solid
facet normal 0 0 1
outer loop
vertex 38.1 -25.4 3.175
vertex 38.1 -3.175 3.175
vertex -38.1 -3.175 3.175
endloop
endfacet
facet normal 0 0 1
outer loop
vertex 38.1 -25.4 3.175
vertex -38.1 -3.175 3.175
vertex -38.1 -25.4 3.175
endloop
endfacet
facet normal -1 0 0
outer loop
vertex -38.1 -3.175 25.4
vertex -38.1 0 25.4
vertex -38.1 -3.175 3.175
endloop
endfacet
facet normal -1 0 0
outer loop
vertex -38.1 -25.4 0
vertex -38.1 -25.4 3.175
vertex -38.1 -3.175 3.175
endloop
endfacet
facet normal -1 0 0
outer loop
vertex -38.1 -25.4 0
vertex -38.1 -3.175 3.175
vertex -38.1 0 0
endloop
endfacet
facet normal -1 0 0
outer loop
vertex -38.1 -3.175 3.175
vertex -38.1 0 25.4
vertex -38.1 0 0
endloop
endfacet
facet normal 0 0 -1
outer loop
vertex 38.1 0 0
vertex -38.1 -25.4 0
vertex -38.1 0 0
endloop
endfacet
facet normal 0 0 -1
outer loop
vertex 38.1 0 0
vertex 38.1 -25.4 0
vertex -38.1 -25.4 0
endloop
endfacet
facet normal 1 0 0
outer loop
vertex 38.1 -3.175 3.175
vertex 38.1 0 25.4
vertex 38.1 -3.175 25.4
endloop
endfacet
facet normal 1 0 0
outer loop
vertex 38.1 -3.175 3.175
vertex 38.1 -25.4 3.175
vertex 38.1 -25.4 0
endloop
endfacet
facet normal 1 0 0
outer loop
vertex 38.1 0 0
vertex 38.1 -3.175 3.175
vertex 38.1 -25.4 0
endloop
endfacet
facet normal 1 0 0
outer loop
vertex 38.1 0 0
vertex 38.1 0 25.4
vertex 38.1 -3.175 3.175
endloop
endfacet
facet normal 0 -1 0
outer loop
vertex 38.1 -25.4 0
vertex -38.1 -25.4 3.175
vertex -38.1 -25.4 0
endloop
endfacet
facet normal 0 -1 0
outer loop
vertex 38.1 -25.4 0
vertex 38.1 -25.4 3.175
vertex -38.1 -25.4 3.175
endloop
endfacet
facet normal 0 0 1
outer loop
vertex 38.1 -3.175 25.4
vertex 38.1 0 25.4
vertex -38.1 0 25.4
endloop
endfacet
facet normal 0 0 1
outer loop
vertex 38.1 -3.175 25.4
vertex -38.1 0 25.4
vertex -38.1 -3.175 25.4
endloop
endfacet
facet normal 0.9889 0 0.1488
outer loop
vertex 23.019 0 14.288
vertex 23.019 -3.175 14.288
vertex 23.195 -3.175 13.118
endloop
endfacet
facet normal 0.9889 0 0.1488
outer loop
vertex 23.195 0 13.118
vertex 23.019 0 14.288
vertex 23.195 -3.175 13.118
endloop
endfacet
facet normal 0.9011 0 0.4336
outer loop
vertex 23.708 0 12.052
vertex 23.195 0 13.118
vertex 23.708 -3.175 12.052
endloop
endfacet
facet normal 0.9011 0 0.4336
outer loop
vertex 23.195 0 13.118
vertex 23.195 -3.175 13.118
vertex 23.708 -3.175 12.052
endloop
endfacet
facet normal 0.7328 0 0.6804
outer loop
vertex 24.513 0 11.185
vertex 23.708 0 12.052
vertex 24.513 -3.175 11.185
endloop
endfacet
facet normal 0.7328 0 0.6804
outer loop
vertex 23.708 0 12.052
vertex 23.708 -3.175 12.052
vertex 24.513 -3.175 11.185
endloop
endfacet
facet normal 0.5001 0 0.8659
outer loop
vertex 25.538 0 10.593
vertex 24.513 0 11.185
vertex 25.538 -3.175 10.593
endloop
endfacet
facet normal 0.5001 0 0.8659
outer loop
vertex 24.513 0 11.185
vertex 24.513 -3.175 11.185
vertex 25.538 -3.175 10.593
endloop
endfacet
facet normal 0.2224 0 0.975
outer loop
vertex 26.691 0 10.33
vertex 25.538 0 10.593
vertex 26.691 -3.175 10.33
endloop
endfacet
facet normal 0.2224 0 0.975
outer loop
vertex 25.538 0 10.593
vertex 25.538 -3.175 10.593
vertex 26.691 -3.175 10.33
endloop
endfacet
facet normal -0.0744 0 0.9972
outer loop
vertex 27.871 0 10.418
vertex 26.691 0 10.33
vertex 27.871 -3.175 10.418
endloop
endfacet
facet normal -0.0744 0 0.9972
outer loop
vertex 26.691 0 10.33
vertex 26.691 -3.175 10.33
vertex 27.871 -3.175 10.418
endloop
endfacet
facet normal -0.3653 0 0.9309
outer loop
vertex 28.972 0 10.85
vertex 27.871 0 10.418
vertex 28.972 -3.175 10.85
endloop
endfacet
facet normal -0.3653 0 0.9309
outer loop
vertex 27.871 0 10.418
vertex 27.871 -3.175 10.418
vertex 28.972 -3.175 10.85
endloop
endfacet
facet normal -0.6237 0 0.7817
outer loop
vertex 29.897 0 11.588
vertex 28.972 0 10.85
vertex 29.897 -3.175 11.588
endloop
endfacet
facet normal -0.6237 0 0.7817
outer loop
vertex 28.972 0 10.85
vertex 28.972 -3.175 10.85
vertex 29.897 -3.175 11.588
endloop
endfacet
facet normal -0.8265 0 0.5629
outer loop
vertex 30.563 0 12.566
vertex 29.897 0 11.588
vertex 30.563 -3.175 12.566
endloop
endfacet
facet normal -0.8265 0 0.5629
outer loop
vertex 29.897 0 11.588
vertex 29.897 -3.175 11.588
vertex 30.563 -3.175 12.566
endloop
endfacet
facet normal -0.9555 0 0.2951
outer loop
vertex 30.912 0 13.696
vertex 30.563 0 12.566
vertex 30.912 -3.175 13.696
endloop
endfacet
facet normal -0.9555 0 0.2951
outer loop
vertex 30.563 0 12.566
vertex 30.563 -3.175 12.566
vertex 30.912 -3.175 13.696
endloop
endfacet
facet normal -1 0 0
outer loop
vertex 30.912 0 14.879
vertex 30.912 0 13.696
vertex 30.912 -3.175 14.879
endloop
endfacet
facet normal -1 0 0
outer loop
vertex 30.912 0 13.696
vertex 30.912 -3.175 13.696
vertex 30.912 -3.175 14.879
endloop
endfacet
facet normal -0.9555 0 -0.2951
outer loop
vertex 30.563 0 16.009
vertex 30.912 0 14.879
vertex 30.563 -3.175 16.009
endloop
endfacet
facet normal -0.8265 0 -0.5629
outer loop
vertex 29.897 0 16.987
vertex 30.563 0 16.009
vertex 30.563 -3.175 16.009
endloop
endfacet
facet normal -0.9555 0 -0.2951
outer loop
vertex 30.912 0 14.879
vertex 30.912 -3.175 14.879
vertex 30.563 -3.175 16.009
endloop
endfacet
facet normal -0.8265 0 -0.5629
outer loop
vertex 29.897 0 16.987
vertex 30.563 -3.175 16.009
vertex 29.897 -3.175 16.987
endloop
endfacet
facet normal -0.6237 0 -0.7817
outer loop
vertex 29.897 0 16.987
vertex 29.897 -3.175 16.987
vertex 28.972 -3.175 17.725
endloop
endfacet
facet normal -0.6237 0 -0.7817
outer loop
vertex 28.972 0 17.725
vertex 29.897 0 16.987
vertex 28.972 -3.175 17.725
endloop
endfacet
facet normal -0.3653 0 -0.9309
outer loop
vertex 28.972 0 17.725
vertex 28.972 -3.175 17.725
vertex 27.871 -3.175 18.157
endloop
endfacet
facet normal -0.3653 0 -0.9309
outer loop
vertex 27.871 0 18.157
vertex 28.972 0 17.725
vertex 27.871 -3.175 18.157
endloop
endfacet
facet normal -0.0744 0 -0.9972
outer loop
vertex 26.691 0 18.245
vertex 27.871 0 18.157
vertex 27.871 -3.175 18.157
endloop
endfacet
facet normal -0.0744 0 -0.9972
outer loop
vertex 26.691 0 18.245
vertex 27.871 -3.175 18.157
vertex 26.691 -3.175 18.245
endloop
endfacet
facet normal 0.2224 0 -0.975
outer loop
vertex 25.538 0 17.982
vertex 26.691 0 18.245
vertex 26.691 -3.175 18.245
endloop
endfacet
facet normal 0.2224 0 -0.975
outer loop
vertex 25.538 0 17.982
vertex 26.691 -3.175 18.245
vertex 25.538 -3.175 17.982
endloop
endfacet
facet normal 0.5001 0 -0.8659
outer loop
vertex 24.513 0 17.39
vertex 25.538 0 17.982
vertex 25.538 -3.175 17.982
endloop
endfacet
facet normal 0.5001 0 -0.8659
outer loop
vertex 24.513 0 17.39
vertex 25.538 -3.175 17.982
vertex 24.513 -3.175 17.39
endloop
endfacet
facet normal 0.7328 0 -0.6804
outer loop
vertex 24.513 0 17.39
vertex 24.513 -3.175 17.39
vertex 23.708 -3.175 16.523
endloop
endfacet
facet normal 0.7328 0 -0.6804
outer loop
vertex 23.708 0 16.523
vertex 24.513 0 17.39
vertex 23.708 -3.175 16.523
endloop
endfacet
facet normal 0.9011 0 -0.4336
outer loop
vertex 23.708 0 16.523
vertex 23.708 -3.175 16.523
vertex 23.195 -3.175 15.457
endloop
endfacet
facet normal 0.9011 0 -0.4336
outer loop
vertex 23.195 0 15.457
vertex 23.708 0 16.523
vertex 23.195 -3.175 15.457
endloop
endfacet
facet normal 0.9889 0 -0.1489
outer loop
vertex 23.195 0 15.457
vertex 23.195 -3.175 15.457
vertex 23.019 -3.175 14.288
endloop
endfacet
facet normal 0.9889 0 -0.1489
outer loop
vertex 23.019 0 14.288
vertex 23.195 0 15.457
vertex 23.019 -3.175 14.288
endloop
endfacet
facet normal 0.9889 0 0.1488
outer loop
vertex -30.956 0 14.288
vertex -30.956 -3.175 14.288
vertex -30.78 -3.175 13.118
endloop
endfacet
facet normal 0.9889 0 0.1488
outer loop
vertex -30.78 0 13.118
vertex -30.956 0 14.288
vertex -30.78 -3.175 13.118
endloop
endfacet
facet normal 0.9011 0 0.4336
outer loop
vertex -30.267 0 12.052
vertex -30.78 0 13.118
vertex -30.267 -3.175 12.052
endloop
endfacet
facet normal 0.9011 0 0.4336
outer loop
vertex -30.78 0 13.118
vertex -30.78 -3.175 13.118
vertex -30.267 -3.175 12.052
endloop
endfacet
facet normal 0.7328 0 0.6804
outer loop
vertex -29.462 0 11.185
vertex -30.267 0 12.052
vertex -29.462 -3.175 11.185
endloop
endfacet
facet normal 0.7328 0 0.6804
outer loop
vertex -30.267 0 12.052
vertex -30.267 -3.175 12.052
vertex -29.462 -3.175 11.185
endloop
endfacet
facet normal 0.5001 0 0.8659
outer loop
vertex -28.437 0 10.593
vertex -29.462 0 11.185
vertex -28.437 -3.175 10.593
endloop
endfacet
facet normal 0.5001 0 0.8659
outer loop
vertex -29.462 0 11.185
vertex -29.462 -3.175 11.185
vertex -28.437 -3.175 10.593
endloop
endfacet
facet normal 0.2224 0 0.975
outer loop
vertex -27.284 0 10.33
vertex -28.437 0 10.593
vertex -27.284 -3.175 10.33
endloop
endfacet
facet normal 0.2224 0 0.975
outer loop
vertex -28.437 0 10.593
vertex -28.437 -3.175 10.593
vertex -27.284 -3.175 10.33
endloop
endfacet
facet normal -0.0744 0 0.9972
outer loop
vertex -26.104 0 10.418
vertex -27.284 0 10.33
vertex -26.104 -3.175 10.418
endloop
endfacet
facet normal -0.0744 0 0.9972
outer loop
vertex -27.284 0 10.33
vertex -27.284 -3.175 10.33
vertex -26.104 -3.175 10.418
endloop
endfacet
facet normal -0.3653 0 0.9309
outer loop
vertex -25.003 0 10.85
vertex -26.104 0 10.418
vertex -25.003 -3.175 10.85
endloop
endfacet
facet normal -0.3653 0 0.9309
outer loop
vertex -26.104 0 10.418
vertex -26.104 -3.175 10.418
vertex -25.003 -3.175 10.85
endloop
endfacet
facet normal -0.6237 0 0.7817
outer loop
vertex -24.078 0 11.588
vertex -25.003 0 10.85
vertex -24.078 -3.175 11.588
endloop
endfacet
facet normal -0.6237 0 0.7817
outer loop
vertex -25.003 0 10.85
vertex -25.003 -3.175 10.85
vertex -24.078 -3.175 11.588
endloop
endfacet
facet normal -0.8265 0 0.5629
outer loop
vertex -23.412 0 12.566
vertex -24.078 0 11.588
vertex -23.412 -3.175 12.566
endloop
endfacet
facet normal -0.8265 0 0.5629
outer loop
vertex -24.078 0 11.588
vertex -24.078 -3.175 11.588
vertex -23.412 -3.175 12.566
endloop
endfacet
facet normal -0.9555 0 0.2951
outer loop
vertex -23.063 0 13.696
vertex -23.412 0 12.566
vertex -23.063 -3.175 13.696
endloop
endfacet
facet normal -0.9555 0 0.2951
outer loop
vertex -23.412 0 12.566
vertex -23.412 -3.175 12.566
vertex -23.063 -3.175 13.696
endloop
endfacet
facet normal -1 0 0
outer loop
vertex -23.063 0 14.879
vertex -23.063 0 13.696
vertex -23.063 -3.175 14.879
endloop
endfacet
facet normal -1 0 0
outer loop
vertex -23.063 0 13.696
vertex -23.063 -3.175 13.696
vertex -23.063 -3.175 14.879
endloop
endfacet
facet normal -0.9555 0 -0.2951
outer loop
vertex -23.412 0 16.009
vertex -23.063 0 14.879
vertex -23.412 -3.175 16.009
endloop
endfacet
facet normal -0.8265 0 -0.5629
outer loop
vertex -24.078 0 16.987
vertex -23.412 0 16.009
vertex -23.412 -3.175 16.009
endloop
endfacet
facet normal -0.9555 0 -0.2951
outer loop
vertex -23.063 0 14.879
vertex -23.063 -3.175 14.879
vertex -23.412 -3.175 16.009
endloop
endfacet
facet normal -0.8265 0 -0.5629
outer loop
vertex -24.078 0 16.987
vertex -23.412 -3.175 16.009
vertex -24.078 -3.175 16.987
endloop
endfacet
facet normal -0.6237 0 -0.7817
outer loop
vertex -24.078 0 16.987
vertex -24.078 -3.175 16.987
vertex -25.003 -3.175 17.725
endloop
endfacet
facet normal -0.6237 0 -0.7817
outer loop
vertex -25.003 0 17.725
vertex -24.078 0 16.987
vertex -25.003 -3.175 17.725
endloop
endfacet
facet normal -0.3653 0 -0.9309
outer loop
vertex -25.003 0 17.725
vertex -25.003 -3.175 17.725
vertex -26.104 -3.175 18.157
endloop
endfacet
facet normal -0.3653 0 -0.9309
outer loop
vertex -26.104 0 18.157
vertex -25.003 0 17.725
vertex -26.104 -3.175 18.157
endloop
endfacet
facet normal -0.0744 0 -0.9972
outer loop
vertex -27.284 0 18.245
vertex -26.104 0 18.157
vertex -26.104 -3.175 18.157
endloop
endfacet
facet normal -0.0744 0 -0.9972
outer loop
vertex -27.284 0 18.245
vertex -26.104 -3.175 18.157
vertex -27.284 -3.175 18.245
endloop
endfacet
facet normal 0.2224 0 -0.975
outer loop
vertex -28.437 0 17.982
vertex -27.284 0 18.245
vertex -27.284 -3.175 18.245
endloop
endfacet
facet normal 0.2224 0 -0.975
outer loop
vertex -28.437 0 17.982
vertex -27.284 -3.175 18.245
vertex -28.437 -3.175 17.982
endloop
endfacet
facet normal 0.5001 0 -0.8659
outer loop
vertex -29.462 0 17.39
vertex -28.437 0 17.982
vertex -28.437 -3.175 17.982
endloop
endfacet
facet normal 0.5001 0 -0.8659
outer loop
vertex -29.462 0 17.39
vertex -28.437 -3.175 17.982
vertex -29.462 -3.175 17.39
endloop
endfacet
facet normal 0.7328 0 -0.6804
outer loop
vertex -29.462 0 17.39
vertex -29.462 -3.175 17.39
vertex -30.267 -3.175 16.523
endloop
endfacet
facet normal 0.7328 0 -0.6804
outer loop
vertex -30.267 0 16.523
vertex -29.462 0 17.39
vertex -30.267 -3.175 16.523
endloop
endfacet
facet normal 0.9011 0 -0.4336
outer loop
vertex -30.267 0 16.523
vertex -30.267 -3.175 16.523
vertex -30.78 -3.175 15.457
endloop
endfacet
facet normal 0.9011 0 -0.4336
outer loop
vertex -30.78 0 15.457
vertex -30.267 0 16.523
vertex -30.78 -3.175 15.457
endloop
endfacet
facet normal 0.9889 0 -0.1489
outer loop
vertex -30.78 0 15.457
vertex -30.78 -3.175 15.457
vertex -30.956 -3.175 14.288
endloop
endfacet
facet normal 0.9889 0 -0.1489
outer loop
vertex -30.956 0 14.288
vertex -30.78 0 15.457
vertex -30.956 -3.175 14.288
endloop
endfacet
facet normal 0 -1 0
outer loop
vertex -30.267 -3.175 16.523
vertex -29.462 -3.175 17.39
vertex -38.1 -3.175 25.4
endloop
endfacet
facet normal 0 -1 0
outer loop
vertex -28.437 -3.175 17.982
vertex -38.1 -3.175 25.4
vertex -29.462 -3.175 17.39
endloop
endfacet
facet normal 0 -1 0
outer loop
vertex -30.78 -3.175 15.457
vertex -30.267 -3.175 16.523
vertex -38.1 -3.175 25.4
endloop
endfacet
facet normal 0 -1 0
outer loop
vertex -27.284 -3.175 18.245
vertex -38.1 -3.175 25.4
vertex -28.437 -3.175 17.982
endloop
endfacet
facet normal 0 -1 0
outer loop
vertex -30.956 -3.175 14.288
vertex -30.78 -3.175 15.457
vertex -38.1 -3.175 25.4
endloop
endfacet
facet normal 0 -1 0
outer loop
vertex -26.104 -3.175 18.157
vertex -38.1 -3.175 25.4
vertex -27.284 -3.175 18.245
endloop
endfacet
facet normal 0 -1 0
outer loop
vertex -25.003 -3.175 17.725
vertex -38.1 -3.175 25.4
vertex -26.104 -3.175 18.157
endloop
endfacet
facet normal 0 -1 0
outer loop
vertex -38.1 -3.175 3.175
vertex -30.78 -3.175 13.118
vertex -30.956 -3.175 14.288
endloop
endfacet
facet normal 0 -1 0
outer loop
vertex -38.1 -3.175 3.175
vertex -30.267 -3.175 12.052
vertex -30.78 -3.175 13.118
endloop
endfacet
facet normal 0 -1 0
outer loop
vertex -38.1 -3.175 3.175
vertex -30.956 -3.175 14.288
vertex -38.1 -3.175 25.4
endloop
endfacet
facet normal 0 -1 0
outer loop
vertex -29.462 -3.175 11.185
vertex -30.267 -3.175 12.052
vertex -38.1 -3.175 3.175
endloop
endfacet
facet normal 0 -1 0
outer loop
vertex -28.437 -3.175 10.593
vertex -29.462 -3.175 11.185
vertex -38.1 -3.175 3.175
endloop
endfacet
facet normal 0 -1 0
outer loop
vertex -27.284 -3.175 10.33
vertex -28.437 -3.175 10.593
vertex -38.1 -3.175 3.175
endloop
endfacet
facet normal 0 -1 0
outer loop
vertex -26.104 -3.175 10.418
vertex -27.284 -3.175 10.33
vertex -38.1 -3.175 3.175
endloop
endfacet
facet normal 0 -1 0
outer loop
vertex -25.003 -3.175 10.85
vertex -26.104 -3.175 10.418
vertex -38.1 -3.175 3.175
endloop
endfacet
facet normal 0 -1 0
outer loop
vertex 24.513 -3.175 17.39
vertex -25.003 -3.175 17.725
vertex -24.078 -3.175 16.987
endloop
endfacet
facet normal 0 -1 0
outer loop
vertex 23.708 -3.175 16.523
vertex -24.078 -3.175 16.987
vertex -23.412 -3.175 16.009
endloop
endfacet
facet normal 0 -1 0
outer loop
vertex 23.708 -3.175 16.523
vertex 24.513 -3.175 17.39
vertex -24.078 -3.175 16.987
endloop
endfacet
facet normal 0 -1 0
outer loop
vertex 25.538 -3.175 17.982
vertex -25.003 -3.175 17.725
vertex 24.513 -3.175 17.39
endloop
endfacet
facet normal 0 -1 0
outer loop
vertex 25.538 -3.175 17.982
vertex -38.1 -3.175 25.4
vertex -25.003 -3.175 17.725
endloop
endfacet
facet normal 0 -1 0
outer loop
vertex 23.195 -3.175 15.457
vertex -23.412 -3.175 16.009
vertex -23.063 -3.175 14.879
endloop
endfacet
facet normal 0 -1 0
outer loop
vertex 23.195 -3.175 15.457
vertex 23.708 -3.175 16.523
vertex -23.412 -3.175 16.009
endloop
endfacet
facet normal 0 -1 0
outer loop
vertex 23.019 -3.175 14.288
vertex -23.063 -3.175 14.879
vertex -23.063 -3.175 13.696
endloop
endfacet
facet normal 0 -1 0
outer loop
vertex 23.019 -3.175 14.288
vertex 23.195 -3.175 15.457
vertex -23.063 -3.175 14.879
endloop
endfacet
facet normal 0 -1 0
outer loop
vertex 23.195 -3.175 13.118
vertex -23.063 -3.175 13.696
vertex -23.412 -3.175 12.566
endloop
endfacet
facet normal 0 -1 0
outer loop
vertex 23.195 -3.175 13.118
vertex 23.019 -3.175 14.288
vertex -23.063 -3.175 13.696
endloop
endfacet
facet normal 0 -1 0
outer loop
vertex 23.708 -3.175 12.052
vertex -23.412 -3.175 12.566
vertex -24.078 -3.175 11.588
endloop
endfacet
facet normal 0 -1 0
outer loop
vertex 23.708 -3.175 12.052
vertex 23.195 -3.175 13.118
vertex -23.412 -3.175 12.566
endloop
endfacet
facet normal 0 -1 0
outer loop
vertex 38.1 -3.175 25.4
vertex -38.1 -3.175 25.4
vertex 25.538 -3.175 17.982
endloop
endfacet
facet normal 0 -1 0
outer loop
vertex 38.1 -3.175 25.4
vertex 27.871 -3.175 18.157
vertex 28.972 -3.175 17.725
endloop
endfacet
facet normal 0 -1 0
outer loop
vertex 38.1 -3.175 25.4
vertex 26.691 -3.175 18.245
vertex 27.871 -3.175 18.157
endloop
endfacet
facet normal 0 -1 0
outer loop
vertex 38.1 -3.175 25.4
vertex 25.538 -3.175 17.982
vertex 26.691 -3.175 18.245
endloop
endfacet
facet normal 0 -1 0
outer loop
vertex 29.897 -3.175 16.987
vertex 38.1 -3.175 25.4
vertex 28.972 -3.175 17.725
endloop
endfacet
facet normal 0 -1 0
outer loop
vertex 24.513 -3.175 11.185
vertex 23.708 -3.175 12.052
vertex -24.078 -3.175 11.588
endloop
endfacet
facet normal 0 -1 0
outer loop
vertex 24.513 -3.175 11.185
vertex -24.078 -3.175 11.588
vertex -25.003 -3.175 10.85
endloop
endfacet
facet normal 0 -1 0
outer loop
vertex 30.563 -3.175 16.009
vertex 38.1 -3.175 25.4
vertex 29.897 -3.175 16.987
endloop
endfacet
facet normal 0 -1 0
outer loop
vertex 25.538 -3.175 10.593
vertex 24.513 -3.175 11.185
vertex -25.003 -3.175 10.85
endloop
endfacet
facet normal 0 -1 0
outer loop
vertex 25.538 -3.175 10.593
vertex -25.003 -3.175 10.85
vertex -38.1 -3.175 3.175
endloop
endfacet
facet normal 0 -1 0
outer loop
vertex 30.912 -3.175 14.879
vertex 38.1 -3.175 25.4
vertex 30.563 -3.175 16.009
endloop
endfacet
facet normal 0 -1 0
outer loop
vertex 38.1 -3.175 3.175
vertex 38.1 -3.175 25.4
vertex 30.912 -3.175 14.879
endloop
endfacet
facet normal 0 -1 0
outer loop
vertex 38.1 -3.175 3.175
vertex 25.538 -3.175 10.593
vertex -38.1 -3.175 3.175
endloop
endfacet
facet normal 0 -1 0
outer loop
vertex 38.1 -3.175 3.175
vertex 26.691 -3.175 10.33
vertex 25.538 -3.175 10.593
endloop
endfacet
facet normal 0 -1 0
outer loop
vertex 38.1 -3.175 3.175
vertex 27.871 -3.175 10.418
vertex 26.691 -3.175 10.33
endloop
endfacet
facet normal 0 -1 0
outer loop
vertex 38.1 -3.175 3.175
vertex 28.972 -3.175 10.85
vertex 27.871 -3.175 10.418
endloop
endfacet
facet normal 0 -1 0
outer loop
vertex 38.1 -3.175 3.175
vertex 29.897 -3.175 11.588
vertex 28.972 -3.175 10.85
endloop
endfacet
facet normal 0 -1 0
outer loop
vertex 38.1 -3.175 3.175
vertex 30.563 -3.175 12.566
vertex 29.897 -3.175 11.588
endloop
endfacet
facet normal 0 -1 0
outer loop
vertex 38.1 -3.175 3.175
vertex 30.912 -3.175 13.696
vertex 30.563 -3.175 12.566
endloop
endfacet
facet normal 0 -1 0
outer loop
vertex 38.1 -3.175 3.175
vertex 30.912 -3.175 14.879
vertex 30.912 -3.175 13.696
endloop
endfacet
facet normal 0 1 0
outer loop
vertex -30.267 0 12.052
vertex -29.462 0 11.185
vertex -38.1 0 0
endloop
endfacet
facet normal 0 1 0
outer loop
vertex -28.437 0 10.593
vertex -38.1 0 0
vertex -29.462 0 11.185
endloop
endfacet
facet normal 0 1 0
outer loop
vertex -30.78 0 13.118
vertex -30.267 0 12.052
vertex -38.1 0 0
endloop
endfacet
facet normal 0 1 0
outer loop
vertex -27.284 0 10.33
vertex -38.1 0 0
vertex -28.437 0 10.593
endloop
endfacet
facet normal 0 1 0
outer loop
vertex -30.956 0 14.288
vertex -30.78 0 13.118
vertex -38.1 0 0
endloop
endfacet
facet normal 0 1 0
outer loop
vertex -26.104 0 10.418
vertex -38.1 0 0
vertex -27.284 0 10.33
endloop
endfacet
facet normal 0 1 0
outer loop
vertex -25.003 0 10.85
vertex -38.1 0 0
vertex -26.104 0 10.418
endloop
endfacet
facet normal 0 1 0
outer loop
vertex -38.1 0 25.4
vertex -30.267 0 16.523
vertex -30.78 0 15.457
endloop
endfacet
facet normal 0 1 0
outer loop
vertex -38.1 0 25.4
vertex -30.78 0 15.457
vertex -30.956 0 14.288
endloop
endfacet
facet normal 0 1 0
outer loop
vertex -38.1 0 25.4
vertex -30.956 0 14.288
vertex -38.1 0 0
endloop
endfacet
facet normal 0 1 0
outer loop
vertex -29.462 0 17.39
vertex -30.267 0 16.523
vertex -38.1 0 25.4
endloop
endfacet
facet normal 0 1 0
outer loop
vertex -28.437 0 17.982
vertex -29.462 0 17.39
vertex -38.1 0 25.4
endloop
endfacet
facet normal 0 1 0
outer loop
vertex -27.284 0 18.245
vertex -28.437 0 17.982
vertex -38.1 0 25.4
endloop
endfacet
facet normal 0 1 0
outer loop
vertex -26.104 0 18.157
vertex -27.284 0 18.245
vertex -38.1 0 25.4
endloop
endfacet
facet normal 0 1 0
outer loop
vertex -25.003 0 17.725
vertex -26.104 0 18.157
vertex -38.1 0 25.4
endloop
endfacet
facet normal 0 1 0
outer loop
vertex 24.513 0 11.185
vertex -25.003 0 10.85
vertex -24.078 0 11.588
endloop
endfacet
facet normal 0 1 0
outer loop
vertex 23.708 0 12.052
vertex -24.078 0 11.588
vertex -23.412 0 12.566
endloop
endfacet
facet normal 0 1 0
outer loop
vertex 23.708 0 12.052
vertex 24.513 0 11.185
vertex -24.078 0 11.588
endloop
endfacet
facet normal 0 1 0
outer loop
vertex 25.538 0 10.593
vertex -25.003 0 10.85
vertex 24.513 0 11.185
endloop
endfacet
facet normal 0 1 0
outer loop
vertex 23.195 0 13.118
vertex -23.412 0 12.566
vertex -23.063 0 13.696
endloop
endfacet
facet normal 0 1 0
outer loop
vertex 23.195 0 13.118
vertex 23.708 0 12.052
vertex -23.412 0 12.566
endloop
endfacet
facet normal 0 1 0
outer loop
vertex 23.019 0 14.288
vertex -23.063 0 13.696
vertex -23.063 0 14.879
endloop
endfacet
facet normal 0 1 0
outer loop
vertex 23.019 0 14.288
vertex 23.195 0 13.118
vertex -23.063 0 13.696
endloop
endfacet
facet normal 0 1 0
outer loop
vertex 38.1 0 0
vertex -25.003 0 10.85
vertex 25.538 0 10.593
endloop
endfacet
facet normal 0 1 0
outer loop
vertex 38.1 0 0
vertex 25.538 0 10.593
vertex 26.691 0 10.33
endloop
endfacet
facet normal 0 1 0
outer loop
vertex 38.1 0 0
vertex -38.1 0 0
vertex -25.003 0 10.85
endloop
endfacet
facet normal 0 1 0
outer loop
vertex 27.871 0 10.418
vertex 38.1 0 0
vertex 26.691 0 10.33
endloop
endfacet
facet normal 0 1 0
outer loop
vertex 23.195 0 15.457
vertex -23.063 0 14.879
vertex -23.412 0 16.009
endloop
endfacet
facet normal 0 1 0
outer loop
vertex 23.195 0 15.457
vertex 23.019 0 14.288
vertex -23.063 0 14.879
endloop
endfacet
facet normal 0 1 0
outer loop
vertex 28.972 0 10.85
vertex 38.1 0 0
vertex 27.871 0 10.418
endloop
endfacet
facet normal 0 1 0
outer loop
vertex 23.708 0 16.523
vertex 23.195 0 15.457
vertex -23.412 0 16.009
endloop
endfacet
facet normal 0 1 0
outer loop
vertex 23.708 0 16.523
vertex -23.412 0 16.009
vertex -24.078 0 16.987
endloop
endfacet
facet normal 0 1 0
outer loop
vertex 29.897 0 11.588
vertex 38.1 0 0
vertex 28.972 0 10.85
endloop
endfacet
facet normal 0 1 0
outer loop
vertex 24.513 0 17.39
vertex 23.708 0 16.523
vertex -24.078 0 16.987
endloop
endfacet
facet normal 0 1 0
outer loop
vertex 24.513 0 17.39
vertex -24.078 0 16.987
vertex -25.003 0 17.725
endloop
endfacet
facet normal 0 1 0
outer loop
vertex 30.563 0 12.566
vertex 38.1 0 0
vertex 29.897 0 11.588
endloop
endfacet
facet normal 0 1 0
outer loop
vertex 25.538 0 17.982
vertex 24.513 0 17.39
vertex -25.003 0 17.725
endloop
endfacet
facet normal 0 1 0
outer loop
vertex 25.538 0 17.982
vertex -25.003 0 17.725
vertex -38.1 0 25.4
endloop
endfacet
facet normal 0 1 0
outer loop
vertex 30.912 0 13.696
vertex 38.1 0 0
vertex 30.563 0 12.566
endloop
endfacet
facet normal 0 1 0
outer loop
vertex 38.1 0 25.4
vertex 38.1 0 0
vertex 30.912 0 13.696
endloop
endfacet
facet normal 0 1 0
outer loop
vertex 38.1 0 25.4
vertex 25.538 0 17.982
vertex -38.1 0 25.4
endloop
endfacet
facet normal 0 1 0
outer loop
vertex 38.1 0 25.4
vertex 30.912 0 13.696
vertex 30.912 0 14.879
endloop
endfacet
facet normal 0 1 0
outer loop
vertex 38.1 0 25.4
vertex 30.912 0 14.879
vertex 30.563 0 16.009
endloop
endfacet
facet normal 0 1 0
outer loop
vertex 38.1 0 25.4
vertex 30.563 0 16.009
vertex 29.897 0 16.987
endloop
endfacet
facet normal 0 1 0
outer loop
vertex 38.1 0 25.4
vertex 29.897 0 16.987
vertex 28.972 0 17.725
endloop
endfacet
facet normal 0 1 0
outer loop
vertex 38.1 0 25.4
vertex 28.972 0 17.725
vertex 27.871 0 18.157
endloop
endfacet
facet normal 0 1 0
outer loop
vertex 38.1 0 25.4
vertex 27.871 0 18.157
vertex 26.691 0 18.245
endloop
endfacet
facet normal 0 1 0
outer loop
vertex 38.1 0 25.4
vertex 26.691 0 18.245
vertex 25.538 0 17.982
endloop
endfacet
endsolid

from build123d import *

# Parameters (mm, degrees)
BOSS_EXTRUDE2_DEPTH                = 38.1
F_5_16_0_3125_DIAMETER_HOLE1_D     = 7.9375
F_5_16_0_3125_DIAMETER_HOLE1_DEPTH = 3.175


with BuildPart() as part:
    # Sketch1 → Boss-Extrude2 (new body, symmetric)
    with BuildSketch(Plane(origin=(0, 0, 0), x_dir=(0, 0, -1), z_dir=(1, 0, 0))):
        Polygon((0, 0), (-25.4, 0), (-25.4, -3.175), (-3.175, -3.175), (-3.175, -25.4), (0, -25.4), align=None)
    extrude(amount=BOSS_EXTRUDE2_DEPTH, both=True)

    # 5/16 (0.3125) Diameter Hole1
    with Locations(Plane(origin=(0, 0, 0), x_dir=(1, 0, 0), z_dir=(0, 1, 0))):
        with Locations((-26.9875, -14.2875), (26.9875, -14.2875)):
            Hole(F_5_16_0_3125_DIAMETER_HOLE1_D / 2, depth=F_5_16_0_3125_DIAMETER_HOLE1_DEPTH)


solid = part.part
